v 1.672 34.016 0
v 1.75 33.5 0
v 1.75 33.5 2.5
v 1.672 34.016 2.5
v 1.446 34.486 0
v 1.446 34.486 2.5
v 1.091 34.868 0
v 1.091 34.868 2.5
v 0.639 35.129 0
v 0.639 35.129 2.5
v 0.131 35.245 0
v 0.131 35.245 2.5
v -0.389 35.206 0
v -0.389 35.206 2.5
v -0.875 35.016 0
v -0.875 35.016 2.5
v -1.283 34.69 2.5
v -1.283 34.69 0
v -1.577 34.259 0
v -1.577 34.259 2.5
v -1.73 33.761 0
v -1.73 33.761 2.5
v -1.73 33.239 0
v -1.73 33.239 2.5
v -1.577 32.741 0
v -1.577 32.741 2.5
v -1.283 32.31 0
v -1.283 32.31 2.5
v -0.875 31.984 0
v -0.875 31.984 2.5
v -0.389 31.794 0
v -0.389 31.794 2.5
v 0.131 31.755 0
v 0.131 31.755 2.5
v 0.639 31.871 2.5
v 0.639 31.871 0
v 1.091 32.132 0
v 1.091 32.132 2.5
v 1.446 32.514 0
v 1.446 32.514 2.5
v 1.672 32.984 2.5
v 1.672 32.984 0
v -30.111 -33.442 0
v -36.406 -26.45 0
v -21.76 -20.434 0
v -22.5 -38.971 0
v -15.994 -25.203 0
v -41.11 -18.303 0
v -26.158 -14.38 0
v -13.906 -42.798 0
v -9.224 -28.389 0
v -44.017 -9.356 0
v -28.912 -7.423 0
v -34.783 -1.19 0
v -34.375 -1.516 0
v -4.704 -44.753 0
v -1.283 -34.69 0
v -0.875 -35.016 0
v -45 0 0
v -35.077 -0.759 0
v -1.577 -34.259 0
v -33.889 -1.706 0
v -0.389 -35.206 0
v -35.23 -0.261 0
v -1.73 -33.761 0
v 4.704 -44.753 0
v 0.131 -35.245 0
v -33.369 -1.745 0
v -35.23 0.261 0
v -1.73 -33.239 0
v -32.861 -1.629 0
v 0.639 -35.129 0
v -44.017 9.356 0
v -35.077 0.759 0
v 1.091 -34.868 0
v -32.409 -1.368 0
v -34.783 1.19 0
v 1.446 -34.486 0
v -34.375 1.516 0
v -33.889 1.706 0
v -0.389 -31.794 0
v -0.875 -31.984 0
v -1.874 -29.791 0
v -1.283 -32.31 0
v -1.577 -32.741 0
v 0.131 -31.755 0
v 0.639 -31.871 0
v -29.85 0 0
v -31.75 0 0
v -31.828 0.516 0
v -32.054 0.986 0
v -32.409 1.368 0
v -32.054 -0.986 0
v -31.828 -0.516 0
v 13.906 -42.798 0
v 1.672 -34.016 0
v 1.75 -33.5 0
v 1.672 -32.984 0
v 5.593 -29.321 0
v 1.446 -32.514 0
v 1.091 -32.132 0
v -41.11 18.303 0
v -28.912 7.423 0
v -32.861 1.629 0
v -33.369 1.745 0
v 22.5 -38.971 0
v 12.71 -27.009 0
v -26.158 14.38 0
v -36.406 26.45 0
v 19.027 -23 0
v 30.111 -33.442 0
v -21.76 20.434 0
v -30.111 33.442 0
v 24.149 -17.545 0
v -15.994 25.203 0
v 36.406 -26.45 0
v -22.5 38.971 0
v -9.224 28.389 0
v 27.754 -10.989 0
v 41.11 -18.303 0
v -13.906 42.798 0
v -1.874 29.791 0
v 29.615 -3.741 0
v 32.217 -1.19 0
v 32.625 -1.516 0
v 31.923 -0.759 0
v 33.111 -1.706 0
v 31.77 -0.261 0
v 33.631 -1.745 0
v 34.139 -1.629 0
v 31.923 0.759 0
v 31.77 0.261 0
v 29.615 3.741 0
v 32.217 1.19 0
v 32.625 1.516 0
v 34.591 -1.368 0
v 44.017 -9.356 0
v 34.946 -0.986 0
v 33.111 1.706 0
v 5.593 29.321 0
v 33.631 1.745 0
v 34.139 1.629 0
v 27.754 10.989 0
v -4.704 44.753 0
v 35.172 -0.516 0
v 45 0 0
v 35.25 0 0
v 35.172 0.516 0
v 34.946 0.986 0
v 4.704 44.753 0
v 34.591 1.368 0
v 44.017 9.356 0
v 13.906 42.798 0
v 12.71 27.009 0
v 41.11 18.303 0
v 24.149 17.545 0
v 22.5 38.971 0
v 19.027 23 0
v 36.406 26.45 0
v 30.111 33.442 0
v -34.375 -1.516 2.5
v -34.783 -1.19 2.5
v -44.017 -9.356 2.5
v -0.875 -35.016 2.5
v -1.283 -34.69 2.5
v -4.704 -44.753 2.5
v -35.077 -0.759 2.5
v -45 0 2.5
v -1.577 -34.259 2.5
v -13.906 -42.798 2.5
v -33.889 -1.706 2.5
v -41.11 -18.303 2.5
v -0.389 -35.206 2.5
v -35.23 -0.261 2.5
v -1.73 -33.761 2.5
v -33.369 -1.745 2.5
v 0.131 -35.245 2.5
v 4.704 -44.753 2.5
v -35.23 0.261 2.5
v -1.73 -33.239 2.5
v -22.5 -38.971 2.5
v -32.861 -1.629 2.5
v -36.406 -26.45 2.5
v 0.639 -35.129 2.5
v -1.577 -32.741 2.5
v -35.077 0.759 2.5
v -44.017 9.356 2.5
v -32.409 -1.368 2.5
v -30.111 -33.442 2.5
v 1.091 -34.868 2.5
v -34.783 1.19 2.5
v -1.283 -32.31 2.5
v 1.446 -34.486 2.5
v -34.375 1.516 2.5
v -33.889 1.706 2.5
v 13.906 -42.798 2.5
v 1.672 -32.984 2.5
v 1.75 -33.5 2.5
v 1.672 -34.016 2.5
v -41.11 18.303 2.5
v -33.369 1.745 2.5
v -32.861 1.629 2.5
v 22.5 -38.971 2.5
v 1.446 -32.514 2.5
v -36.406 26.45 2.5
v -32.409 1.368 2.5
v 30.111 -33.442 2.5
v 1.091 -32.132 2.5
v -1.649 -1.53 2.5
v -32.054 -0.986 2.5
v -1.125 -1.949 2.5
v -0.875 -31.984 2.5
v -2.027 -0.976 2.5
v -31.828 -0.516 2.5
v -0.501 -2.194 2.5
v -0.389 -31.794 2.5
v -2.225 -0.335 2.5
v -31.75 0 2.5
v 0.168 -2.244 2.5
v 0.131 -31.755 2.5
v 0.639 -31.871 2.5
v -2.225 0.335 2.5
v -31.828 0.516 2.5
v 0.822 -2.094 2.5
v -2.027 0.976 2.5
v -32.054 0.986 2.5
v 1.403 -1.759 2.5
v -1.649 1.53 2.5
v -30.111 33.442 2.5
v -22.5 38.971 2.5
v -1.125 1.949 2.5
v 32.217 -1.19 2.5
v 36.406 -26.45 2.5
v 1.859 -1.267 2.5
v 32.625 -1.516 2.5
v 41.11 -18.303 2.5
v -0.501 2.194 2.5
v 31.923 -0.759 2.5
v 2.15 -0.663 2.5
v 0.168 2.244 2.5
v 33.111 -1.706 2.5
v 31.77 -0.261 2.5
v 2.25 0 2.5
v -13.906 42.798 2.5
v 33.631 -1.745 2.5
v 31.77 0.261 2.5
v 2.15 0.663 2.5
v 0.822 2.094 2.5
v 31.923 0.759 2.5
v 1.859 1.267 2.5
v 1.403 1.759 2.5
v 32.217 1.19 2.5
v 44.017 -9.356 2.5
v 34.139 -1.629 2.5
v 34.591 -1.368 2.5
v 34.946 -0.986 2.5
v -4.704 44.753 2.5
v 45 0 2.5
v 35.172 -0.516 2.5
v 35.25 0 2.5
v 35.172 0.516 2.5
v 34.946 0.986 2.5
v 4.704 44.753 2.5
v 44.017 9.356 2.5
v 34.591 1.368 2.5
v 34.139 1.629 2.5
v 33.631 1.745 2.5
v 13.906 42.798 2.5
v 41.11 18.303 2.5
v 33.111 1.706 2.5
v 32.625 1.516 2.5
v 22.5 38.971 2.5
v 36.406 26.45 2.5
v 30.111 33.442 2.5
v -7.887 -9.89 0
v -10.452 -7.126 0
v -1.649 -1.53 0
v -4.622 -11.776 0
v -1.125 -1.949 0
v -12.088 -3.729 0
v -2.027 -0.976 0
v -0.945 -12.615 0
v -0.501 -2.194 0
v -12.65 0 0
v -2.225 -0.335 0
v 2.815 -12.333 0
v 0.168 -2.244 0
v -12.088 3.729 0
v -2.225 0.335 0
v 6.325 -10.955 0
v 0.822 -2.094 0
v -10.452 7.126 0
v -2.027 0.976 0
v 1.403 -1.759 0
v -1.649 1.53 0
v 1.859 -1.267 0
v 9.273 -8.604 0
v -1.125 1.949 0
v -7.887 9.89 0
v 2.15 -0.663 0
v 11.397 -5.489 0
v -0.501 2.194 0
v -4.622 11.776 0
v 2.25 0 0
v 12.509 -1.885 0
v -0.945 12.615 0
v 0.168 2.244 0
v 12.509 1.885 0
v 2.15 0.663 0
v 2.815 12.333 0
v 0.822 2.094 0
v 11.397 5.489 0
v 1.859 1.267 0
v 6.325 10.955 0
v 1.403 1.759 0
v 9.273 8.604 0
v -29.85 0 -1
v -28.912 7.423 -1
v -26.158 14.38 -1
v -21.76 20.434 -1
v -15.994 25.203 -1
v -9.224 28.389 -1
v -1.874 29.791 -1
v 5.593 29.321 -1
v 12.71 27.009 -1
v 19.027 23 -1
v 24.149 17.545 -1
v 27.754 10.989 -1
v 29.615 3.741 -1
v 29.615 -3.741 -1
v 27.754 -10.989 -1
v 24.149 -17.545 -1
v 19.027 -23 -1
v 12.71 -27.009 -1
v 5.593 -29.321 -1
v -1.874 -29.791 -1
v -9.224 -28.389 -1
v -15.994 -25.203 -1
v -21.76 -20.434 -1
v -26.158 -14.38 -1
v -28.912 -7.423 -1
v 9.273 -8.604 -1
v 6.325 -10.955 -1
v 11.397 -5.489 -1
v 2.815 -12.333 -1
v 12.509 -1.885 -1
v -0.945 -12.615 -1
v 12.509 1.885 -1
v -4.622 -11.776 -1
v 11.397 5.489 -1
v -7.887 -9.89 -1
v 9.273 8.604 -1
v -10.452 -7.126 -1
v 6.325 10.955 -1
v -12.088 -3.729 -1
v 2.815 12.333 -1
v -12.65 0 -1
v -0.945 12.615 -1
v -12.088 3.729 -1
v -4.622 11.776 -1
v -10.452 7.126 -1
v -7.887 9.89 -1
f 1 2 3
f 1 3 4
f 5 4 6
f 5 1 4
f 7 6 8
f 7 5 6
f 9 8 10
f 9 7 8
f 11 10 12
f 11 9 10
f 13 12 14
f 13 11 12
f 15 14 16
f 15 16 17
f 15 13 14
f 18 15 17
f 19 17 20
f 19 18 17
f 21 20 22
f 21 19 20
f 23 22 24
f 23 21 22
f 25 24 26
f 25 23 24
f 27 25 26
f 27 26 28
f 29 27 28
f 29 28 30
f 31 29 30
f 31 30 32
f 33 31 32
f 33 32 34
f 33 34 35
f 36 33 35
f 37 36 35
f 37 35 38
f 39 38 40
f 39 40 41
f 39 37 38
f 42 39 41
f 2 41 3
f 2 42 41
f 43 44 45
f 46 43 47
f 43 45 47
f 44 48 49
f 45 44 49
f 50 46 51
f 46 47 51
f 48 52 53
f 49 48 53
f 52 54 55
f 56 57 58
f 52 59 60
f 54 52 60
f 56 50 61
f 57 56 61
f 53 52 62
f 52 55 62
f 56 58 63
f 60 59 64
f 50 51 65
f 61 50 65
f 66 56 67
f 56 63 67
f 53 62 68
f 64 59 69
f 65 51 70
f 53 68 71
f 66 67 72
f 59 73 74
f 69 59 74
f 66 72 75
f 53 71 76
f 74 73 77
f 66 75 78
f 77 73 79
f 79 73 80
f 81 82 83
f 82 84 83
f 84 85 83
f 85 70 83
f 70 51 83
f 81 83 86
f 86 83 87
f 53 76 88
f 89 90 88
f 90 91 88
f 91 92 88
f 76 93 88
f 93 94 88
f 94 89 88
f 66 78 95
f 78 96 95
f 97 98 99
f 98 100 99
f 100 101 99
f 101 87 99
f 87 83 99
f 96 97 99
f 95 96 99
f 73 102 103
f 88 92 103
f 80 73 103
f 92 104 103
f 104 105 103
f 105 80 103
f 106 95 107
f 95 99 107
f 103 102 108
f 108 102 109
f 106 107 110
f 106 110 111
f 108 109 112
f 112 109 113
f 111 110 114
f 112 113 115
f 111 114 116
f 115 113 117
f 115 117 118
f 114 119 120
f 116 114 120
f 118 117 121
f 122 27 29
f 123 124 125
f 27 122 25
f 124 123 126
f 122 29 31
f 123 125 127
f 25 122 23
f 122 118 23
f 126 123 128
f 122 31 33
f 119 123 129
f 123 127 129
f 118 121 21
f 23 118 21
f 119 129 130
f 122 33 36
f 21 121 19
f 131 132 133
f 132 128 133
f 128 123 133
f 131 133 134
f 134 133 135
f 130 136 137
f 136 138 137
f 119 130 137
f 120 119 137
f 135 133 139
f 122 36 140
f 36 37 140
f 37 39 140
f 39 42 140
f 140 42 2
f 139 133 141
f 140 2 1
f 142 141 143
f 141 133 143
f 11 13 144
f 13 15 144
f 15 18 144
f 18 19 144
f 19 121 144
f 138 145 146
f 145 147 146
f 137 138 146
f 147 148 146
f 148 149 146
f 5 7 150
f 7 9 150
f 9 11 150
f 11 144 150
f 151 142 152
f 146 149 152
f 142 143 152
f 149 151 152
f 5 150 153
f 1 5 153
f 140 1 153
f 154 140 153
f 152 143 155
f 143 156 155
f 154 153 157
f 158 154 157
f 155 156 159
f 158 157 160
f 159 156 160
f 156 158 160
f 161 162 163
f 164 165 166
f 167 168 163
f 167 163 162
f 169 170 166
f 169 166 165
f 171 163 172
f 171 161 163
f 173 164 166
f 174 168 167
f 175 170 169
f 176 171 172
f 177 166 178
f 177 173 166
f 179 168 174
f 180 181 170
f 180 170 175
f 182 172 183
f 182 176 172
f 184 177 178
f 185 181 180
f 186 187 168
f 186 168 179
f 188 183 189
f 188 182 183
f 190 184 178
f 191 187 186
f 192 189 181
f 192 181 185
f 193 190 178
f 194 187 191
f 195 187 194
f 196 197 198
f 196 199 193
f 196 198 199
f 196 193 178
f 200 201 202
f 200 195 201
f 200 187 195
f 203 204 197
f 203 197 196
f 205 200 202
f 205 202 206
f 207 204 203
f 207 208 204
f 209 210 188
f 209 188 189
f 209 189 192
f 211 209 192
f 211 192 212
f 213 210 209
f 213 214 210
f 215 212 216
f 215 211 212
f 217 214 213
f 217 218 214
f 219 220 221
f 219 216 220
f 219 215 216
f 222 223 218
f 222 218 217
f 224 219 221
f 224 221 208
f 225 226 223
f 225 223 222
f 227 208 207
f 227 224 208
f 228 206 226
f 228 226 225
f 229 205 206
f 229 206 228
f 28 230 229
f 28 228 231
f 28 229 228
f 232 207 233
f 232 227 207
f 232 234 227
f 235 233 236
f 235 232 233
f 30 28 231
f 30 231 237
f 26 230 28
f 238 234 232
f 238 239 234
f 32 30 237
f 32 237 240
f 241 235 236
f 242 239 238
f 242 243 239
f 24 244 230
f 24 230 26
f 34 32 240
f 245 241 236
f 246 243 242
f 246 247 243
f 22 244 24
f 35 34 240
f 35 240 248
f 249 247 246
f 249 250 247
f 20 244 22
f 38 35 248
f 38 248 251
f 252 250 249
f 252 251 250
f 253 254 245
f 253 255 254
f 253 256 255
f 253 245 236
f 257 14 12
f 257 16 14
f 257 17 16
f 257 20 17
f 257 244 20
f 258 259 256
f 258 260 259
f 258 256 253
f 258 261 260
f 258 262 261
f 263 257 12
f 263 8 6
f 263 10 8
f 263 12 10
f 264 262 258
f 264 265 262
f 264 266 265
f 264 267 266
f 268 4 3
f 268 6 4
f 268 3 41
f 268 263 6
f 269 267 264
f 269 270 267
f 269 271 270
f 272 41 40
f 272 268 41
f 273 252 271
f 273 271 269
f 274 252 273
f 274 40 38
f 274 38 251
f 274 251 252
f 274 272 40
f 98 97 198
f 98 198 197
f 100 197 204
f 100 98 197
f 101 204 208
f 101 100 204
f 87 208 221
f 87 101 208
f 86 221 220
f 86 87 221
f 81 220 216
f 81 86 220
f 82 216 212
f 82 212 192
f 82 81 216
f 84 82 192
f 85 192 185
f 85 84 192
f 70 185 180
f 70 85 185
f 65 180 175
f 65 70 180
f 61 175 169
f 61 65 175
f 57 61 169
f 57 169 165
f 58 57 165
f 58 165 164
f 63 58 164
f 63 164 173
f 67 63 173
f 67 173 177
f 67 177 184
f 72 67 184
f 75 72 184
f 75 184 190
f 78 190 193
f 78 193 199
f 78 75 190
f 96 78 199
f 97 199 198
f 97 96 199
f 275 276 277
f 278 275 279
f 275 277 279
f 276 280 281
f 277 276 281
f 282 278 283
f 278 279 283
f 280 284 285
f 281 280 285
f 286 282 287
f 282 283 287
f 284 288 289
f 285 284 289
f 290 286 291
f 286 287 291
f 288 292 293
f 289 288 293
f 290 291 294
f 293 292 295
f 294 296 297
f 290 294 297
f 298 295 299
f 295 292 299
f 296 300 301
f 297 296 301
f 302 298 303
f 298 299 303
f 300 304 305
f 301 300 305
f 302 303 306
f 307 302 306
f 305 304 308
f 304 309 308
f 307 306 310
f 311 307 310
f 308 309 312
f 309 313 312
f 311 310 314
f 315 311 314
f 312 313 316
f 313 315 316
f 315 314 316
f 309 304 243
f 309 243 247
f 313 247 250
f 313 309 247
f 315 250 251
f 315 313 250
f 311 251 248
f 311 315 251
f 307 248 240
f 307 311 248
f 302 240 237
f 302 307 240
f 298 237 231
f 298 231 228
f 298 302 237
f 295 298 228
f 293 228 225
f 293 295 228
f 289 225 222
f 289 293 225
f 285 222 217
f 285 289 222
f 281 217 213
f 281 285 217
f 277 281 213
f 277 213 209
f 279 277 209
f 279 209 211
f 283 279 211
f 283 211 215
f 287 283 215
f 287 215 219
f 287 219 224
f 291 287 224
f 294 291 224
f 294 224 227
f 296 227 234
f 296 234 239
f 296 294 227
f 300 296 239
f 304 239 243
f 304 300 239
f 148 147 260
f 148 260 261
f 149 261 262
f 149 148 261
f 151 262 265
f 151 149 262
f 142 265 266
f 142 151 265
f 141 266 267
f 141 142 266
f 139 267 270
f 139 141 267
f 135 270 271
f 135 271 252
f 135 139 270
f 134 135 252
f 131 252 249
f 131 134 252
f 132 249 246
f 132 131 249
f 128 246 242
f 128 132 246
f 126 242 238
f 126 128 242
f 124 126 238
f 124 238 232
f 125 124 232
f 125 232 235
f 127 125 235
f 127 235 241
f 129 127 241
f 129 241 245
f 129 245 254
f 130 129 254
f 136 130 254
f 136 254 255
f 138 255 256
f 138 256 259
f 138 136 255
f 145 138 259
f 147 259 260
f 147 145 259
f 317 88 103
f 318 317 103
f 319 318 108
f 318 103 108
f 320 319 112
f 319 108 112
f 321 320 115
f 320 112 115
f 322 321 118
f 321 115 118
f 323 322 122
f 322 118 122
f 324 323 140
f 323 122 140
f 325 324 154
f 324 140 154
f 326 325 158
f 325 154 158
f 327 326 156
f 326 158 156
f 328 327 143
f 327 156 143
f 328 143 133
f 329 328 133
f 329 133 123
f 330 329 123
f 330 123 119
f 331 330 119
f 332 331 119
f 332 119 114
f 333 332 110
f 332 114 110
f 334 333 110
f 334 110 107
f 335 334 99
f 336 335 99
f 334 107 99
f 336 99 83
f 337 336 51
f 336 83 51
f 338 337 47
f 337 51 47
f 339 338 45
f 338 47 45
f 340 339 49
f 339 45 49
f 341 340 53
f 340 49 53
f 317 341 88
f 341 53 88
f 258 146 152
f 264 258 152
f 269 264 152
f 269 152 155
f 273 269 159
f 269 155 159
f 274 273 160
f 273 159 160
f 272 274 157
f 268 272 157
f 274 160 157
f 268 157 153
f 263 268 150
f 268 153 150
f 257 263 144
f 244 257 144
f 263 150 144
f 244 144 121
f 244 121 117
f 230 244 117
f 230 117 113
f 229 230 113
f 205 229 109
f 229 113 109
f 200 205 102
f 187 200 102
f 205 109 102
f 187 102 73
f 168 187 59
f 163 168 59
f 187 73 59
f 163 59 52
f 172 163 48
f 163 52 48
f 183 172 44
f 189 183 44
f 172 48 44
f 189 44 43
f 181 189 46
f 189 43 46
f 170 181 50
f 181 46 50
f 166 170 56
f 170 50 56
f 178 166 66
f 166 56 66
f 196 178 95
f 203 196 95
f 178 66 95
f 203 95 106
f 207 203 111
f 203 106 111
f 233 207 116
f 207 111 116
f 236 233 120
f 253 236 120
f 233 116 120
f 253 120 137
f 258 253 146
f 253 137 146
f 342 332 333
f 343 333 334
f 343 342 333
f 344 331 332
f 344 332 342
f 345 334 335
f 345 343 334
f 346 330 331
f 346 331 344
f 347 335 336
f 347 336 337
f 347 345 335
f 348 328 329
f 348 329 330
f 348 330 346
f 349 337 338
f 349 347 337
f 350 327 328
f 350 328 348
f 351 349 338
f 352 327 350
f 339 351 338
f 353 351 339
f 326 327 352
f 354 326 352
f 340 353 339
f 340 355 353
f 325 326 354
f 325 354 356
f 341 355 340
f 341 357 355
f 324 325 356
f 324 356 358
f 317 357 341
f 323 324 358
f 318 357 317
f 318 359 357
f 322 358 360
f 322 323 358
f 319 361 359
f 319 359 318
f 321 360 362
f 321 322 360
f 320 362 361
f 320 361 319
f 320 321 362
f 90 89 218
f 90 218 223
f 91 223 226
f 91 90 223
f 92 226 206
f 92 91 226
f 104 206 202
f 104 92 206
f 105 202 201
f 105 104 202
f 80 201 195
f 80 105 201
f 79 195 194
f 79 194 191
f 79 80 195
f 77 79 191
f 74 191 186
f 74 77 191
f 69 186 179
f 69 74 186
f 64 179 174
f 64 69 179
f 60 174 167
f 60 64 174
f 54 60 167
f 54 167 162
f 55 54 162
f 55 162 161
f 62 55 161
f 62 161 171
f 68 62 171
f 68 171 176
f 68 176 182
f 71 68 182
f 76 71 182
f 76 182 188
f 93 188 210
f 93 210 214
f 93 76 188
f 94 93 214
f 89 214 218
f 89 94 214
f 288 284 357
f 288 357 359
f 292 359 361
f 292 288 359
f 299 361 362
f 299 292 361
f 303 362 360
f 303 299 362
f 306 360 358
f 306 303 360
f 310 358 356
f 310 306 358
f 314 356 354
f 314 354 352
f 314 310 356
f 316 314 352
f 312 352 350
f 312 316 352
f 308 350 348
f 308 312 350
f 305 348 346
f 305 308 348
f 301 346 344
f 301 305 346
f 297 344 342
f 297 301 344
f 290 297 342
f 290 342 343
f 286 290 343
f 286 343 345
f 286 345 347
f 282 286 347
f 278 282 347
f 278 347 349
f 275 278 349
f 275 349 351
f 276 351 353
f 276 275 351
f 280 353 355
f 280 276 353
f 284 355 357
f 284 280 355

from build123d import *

# Parameters (mm, degrees)
SKETCH1_R           = 45
SKETCH1_R_2         = 2.25
SKETCH1_R_3         = 1.75
BOSS_EXTRUDE1_DEPTH = 2.5
SKETCH2_R           = 29.85
SKETCH2_R_2         = 12.65
BOSS_EXTRUDE2_DEPTH = 1


with BuildPart() as part:
    # Sketch1 → Boss-Extrude1 (new body)
    with BuildSketch(Plane.XY):
        Circle(SKETCH1_R)
        Circle(SKETCH1_R_2, mode=Mode.SUBTRACT)
        with Locations((0, 33.5)):
            Circle(SKETCH1_R_3, mode=Mode.SUBTRACT)
        with Locations((33.5, 0)):
            Circle(SKETCH1_R_3, mode=Mode.SUBTRACT)
        with Locations((0, -33.5)):
            Circle(SKETCH1_R_3, mode=Mode.SUBTRACT)
        with Locations((-33.5, 0)):
            Circle(SKETCH1_R_3, mode=Mode.SUBTRACT)
    extrude(amount=BOSS_EXTRUDE1_DEPTH)

    # Sketch2 → Boss-Extrude2 (add)
    with BuildSketch(Plane(origin=(0, 0, 0), x_dir=(-1, 0, 0), z_dir=(0, 0, -1))):
        Circle(SKETCH2_R)
        Circle(SKETCH2_R_2, mode=Mode.SUBTRACT)
    extrude(amount=BOSS_EXTRUDE2_DEPTH)


solid = part.part
